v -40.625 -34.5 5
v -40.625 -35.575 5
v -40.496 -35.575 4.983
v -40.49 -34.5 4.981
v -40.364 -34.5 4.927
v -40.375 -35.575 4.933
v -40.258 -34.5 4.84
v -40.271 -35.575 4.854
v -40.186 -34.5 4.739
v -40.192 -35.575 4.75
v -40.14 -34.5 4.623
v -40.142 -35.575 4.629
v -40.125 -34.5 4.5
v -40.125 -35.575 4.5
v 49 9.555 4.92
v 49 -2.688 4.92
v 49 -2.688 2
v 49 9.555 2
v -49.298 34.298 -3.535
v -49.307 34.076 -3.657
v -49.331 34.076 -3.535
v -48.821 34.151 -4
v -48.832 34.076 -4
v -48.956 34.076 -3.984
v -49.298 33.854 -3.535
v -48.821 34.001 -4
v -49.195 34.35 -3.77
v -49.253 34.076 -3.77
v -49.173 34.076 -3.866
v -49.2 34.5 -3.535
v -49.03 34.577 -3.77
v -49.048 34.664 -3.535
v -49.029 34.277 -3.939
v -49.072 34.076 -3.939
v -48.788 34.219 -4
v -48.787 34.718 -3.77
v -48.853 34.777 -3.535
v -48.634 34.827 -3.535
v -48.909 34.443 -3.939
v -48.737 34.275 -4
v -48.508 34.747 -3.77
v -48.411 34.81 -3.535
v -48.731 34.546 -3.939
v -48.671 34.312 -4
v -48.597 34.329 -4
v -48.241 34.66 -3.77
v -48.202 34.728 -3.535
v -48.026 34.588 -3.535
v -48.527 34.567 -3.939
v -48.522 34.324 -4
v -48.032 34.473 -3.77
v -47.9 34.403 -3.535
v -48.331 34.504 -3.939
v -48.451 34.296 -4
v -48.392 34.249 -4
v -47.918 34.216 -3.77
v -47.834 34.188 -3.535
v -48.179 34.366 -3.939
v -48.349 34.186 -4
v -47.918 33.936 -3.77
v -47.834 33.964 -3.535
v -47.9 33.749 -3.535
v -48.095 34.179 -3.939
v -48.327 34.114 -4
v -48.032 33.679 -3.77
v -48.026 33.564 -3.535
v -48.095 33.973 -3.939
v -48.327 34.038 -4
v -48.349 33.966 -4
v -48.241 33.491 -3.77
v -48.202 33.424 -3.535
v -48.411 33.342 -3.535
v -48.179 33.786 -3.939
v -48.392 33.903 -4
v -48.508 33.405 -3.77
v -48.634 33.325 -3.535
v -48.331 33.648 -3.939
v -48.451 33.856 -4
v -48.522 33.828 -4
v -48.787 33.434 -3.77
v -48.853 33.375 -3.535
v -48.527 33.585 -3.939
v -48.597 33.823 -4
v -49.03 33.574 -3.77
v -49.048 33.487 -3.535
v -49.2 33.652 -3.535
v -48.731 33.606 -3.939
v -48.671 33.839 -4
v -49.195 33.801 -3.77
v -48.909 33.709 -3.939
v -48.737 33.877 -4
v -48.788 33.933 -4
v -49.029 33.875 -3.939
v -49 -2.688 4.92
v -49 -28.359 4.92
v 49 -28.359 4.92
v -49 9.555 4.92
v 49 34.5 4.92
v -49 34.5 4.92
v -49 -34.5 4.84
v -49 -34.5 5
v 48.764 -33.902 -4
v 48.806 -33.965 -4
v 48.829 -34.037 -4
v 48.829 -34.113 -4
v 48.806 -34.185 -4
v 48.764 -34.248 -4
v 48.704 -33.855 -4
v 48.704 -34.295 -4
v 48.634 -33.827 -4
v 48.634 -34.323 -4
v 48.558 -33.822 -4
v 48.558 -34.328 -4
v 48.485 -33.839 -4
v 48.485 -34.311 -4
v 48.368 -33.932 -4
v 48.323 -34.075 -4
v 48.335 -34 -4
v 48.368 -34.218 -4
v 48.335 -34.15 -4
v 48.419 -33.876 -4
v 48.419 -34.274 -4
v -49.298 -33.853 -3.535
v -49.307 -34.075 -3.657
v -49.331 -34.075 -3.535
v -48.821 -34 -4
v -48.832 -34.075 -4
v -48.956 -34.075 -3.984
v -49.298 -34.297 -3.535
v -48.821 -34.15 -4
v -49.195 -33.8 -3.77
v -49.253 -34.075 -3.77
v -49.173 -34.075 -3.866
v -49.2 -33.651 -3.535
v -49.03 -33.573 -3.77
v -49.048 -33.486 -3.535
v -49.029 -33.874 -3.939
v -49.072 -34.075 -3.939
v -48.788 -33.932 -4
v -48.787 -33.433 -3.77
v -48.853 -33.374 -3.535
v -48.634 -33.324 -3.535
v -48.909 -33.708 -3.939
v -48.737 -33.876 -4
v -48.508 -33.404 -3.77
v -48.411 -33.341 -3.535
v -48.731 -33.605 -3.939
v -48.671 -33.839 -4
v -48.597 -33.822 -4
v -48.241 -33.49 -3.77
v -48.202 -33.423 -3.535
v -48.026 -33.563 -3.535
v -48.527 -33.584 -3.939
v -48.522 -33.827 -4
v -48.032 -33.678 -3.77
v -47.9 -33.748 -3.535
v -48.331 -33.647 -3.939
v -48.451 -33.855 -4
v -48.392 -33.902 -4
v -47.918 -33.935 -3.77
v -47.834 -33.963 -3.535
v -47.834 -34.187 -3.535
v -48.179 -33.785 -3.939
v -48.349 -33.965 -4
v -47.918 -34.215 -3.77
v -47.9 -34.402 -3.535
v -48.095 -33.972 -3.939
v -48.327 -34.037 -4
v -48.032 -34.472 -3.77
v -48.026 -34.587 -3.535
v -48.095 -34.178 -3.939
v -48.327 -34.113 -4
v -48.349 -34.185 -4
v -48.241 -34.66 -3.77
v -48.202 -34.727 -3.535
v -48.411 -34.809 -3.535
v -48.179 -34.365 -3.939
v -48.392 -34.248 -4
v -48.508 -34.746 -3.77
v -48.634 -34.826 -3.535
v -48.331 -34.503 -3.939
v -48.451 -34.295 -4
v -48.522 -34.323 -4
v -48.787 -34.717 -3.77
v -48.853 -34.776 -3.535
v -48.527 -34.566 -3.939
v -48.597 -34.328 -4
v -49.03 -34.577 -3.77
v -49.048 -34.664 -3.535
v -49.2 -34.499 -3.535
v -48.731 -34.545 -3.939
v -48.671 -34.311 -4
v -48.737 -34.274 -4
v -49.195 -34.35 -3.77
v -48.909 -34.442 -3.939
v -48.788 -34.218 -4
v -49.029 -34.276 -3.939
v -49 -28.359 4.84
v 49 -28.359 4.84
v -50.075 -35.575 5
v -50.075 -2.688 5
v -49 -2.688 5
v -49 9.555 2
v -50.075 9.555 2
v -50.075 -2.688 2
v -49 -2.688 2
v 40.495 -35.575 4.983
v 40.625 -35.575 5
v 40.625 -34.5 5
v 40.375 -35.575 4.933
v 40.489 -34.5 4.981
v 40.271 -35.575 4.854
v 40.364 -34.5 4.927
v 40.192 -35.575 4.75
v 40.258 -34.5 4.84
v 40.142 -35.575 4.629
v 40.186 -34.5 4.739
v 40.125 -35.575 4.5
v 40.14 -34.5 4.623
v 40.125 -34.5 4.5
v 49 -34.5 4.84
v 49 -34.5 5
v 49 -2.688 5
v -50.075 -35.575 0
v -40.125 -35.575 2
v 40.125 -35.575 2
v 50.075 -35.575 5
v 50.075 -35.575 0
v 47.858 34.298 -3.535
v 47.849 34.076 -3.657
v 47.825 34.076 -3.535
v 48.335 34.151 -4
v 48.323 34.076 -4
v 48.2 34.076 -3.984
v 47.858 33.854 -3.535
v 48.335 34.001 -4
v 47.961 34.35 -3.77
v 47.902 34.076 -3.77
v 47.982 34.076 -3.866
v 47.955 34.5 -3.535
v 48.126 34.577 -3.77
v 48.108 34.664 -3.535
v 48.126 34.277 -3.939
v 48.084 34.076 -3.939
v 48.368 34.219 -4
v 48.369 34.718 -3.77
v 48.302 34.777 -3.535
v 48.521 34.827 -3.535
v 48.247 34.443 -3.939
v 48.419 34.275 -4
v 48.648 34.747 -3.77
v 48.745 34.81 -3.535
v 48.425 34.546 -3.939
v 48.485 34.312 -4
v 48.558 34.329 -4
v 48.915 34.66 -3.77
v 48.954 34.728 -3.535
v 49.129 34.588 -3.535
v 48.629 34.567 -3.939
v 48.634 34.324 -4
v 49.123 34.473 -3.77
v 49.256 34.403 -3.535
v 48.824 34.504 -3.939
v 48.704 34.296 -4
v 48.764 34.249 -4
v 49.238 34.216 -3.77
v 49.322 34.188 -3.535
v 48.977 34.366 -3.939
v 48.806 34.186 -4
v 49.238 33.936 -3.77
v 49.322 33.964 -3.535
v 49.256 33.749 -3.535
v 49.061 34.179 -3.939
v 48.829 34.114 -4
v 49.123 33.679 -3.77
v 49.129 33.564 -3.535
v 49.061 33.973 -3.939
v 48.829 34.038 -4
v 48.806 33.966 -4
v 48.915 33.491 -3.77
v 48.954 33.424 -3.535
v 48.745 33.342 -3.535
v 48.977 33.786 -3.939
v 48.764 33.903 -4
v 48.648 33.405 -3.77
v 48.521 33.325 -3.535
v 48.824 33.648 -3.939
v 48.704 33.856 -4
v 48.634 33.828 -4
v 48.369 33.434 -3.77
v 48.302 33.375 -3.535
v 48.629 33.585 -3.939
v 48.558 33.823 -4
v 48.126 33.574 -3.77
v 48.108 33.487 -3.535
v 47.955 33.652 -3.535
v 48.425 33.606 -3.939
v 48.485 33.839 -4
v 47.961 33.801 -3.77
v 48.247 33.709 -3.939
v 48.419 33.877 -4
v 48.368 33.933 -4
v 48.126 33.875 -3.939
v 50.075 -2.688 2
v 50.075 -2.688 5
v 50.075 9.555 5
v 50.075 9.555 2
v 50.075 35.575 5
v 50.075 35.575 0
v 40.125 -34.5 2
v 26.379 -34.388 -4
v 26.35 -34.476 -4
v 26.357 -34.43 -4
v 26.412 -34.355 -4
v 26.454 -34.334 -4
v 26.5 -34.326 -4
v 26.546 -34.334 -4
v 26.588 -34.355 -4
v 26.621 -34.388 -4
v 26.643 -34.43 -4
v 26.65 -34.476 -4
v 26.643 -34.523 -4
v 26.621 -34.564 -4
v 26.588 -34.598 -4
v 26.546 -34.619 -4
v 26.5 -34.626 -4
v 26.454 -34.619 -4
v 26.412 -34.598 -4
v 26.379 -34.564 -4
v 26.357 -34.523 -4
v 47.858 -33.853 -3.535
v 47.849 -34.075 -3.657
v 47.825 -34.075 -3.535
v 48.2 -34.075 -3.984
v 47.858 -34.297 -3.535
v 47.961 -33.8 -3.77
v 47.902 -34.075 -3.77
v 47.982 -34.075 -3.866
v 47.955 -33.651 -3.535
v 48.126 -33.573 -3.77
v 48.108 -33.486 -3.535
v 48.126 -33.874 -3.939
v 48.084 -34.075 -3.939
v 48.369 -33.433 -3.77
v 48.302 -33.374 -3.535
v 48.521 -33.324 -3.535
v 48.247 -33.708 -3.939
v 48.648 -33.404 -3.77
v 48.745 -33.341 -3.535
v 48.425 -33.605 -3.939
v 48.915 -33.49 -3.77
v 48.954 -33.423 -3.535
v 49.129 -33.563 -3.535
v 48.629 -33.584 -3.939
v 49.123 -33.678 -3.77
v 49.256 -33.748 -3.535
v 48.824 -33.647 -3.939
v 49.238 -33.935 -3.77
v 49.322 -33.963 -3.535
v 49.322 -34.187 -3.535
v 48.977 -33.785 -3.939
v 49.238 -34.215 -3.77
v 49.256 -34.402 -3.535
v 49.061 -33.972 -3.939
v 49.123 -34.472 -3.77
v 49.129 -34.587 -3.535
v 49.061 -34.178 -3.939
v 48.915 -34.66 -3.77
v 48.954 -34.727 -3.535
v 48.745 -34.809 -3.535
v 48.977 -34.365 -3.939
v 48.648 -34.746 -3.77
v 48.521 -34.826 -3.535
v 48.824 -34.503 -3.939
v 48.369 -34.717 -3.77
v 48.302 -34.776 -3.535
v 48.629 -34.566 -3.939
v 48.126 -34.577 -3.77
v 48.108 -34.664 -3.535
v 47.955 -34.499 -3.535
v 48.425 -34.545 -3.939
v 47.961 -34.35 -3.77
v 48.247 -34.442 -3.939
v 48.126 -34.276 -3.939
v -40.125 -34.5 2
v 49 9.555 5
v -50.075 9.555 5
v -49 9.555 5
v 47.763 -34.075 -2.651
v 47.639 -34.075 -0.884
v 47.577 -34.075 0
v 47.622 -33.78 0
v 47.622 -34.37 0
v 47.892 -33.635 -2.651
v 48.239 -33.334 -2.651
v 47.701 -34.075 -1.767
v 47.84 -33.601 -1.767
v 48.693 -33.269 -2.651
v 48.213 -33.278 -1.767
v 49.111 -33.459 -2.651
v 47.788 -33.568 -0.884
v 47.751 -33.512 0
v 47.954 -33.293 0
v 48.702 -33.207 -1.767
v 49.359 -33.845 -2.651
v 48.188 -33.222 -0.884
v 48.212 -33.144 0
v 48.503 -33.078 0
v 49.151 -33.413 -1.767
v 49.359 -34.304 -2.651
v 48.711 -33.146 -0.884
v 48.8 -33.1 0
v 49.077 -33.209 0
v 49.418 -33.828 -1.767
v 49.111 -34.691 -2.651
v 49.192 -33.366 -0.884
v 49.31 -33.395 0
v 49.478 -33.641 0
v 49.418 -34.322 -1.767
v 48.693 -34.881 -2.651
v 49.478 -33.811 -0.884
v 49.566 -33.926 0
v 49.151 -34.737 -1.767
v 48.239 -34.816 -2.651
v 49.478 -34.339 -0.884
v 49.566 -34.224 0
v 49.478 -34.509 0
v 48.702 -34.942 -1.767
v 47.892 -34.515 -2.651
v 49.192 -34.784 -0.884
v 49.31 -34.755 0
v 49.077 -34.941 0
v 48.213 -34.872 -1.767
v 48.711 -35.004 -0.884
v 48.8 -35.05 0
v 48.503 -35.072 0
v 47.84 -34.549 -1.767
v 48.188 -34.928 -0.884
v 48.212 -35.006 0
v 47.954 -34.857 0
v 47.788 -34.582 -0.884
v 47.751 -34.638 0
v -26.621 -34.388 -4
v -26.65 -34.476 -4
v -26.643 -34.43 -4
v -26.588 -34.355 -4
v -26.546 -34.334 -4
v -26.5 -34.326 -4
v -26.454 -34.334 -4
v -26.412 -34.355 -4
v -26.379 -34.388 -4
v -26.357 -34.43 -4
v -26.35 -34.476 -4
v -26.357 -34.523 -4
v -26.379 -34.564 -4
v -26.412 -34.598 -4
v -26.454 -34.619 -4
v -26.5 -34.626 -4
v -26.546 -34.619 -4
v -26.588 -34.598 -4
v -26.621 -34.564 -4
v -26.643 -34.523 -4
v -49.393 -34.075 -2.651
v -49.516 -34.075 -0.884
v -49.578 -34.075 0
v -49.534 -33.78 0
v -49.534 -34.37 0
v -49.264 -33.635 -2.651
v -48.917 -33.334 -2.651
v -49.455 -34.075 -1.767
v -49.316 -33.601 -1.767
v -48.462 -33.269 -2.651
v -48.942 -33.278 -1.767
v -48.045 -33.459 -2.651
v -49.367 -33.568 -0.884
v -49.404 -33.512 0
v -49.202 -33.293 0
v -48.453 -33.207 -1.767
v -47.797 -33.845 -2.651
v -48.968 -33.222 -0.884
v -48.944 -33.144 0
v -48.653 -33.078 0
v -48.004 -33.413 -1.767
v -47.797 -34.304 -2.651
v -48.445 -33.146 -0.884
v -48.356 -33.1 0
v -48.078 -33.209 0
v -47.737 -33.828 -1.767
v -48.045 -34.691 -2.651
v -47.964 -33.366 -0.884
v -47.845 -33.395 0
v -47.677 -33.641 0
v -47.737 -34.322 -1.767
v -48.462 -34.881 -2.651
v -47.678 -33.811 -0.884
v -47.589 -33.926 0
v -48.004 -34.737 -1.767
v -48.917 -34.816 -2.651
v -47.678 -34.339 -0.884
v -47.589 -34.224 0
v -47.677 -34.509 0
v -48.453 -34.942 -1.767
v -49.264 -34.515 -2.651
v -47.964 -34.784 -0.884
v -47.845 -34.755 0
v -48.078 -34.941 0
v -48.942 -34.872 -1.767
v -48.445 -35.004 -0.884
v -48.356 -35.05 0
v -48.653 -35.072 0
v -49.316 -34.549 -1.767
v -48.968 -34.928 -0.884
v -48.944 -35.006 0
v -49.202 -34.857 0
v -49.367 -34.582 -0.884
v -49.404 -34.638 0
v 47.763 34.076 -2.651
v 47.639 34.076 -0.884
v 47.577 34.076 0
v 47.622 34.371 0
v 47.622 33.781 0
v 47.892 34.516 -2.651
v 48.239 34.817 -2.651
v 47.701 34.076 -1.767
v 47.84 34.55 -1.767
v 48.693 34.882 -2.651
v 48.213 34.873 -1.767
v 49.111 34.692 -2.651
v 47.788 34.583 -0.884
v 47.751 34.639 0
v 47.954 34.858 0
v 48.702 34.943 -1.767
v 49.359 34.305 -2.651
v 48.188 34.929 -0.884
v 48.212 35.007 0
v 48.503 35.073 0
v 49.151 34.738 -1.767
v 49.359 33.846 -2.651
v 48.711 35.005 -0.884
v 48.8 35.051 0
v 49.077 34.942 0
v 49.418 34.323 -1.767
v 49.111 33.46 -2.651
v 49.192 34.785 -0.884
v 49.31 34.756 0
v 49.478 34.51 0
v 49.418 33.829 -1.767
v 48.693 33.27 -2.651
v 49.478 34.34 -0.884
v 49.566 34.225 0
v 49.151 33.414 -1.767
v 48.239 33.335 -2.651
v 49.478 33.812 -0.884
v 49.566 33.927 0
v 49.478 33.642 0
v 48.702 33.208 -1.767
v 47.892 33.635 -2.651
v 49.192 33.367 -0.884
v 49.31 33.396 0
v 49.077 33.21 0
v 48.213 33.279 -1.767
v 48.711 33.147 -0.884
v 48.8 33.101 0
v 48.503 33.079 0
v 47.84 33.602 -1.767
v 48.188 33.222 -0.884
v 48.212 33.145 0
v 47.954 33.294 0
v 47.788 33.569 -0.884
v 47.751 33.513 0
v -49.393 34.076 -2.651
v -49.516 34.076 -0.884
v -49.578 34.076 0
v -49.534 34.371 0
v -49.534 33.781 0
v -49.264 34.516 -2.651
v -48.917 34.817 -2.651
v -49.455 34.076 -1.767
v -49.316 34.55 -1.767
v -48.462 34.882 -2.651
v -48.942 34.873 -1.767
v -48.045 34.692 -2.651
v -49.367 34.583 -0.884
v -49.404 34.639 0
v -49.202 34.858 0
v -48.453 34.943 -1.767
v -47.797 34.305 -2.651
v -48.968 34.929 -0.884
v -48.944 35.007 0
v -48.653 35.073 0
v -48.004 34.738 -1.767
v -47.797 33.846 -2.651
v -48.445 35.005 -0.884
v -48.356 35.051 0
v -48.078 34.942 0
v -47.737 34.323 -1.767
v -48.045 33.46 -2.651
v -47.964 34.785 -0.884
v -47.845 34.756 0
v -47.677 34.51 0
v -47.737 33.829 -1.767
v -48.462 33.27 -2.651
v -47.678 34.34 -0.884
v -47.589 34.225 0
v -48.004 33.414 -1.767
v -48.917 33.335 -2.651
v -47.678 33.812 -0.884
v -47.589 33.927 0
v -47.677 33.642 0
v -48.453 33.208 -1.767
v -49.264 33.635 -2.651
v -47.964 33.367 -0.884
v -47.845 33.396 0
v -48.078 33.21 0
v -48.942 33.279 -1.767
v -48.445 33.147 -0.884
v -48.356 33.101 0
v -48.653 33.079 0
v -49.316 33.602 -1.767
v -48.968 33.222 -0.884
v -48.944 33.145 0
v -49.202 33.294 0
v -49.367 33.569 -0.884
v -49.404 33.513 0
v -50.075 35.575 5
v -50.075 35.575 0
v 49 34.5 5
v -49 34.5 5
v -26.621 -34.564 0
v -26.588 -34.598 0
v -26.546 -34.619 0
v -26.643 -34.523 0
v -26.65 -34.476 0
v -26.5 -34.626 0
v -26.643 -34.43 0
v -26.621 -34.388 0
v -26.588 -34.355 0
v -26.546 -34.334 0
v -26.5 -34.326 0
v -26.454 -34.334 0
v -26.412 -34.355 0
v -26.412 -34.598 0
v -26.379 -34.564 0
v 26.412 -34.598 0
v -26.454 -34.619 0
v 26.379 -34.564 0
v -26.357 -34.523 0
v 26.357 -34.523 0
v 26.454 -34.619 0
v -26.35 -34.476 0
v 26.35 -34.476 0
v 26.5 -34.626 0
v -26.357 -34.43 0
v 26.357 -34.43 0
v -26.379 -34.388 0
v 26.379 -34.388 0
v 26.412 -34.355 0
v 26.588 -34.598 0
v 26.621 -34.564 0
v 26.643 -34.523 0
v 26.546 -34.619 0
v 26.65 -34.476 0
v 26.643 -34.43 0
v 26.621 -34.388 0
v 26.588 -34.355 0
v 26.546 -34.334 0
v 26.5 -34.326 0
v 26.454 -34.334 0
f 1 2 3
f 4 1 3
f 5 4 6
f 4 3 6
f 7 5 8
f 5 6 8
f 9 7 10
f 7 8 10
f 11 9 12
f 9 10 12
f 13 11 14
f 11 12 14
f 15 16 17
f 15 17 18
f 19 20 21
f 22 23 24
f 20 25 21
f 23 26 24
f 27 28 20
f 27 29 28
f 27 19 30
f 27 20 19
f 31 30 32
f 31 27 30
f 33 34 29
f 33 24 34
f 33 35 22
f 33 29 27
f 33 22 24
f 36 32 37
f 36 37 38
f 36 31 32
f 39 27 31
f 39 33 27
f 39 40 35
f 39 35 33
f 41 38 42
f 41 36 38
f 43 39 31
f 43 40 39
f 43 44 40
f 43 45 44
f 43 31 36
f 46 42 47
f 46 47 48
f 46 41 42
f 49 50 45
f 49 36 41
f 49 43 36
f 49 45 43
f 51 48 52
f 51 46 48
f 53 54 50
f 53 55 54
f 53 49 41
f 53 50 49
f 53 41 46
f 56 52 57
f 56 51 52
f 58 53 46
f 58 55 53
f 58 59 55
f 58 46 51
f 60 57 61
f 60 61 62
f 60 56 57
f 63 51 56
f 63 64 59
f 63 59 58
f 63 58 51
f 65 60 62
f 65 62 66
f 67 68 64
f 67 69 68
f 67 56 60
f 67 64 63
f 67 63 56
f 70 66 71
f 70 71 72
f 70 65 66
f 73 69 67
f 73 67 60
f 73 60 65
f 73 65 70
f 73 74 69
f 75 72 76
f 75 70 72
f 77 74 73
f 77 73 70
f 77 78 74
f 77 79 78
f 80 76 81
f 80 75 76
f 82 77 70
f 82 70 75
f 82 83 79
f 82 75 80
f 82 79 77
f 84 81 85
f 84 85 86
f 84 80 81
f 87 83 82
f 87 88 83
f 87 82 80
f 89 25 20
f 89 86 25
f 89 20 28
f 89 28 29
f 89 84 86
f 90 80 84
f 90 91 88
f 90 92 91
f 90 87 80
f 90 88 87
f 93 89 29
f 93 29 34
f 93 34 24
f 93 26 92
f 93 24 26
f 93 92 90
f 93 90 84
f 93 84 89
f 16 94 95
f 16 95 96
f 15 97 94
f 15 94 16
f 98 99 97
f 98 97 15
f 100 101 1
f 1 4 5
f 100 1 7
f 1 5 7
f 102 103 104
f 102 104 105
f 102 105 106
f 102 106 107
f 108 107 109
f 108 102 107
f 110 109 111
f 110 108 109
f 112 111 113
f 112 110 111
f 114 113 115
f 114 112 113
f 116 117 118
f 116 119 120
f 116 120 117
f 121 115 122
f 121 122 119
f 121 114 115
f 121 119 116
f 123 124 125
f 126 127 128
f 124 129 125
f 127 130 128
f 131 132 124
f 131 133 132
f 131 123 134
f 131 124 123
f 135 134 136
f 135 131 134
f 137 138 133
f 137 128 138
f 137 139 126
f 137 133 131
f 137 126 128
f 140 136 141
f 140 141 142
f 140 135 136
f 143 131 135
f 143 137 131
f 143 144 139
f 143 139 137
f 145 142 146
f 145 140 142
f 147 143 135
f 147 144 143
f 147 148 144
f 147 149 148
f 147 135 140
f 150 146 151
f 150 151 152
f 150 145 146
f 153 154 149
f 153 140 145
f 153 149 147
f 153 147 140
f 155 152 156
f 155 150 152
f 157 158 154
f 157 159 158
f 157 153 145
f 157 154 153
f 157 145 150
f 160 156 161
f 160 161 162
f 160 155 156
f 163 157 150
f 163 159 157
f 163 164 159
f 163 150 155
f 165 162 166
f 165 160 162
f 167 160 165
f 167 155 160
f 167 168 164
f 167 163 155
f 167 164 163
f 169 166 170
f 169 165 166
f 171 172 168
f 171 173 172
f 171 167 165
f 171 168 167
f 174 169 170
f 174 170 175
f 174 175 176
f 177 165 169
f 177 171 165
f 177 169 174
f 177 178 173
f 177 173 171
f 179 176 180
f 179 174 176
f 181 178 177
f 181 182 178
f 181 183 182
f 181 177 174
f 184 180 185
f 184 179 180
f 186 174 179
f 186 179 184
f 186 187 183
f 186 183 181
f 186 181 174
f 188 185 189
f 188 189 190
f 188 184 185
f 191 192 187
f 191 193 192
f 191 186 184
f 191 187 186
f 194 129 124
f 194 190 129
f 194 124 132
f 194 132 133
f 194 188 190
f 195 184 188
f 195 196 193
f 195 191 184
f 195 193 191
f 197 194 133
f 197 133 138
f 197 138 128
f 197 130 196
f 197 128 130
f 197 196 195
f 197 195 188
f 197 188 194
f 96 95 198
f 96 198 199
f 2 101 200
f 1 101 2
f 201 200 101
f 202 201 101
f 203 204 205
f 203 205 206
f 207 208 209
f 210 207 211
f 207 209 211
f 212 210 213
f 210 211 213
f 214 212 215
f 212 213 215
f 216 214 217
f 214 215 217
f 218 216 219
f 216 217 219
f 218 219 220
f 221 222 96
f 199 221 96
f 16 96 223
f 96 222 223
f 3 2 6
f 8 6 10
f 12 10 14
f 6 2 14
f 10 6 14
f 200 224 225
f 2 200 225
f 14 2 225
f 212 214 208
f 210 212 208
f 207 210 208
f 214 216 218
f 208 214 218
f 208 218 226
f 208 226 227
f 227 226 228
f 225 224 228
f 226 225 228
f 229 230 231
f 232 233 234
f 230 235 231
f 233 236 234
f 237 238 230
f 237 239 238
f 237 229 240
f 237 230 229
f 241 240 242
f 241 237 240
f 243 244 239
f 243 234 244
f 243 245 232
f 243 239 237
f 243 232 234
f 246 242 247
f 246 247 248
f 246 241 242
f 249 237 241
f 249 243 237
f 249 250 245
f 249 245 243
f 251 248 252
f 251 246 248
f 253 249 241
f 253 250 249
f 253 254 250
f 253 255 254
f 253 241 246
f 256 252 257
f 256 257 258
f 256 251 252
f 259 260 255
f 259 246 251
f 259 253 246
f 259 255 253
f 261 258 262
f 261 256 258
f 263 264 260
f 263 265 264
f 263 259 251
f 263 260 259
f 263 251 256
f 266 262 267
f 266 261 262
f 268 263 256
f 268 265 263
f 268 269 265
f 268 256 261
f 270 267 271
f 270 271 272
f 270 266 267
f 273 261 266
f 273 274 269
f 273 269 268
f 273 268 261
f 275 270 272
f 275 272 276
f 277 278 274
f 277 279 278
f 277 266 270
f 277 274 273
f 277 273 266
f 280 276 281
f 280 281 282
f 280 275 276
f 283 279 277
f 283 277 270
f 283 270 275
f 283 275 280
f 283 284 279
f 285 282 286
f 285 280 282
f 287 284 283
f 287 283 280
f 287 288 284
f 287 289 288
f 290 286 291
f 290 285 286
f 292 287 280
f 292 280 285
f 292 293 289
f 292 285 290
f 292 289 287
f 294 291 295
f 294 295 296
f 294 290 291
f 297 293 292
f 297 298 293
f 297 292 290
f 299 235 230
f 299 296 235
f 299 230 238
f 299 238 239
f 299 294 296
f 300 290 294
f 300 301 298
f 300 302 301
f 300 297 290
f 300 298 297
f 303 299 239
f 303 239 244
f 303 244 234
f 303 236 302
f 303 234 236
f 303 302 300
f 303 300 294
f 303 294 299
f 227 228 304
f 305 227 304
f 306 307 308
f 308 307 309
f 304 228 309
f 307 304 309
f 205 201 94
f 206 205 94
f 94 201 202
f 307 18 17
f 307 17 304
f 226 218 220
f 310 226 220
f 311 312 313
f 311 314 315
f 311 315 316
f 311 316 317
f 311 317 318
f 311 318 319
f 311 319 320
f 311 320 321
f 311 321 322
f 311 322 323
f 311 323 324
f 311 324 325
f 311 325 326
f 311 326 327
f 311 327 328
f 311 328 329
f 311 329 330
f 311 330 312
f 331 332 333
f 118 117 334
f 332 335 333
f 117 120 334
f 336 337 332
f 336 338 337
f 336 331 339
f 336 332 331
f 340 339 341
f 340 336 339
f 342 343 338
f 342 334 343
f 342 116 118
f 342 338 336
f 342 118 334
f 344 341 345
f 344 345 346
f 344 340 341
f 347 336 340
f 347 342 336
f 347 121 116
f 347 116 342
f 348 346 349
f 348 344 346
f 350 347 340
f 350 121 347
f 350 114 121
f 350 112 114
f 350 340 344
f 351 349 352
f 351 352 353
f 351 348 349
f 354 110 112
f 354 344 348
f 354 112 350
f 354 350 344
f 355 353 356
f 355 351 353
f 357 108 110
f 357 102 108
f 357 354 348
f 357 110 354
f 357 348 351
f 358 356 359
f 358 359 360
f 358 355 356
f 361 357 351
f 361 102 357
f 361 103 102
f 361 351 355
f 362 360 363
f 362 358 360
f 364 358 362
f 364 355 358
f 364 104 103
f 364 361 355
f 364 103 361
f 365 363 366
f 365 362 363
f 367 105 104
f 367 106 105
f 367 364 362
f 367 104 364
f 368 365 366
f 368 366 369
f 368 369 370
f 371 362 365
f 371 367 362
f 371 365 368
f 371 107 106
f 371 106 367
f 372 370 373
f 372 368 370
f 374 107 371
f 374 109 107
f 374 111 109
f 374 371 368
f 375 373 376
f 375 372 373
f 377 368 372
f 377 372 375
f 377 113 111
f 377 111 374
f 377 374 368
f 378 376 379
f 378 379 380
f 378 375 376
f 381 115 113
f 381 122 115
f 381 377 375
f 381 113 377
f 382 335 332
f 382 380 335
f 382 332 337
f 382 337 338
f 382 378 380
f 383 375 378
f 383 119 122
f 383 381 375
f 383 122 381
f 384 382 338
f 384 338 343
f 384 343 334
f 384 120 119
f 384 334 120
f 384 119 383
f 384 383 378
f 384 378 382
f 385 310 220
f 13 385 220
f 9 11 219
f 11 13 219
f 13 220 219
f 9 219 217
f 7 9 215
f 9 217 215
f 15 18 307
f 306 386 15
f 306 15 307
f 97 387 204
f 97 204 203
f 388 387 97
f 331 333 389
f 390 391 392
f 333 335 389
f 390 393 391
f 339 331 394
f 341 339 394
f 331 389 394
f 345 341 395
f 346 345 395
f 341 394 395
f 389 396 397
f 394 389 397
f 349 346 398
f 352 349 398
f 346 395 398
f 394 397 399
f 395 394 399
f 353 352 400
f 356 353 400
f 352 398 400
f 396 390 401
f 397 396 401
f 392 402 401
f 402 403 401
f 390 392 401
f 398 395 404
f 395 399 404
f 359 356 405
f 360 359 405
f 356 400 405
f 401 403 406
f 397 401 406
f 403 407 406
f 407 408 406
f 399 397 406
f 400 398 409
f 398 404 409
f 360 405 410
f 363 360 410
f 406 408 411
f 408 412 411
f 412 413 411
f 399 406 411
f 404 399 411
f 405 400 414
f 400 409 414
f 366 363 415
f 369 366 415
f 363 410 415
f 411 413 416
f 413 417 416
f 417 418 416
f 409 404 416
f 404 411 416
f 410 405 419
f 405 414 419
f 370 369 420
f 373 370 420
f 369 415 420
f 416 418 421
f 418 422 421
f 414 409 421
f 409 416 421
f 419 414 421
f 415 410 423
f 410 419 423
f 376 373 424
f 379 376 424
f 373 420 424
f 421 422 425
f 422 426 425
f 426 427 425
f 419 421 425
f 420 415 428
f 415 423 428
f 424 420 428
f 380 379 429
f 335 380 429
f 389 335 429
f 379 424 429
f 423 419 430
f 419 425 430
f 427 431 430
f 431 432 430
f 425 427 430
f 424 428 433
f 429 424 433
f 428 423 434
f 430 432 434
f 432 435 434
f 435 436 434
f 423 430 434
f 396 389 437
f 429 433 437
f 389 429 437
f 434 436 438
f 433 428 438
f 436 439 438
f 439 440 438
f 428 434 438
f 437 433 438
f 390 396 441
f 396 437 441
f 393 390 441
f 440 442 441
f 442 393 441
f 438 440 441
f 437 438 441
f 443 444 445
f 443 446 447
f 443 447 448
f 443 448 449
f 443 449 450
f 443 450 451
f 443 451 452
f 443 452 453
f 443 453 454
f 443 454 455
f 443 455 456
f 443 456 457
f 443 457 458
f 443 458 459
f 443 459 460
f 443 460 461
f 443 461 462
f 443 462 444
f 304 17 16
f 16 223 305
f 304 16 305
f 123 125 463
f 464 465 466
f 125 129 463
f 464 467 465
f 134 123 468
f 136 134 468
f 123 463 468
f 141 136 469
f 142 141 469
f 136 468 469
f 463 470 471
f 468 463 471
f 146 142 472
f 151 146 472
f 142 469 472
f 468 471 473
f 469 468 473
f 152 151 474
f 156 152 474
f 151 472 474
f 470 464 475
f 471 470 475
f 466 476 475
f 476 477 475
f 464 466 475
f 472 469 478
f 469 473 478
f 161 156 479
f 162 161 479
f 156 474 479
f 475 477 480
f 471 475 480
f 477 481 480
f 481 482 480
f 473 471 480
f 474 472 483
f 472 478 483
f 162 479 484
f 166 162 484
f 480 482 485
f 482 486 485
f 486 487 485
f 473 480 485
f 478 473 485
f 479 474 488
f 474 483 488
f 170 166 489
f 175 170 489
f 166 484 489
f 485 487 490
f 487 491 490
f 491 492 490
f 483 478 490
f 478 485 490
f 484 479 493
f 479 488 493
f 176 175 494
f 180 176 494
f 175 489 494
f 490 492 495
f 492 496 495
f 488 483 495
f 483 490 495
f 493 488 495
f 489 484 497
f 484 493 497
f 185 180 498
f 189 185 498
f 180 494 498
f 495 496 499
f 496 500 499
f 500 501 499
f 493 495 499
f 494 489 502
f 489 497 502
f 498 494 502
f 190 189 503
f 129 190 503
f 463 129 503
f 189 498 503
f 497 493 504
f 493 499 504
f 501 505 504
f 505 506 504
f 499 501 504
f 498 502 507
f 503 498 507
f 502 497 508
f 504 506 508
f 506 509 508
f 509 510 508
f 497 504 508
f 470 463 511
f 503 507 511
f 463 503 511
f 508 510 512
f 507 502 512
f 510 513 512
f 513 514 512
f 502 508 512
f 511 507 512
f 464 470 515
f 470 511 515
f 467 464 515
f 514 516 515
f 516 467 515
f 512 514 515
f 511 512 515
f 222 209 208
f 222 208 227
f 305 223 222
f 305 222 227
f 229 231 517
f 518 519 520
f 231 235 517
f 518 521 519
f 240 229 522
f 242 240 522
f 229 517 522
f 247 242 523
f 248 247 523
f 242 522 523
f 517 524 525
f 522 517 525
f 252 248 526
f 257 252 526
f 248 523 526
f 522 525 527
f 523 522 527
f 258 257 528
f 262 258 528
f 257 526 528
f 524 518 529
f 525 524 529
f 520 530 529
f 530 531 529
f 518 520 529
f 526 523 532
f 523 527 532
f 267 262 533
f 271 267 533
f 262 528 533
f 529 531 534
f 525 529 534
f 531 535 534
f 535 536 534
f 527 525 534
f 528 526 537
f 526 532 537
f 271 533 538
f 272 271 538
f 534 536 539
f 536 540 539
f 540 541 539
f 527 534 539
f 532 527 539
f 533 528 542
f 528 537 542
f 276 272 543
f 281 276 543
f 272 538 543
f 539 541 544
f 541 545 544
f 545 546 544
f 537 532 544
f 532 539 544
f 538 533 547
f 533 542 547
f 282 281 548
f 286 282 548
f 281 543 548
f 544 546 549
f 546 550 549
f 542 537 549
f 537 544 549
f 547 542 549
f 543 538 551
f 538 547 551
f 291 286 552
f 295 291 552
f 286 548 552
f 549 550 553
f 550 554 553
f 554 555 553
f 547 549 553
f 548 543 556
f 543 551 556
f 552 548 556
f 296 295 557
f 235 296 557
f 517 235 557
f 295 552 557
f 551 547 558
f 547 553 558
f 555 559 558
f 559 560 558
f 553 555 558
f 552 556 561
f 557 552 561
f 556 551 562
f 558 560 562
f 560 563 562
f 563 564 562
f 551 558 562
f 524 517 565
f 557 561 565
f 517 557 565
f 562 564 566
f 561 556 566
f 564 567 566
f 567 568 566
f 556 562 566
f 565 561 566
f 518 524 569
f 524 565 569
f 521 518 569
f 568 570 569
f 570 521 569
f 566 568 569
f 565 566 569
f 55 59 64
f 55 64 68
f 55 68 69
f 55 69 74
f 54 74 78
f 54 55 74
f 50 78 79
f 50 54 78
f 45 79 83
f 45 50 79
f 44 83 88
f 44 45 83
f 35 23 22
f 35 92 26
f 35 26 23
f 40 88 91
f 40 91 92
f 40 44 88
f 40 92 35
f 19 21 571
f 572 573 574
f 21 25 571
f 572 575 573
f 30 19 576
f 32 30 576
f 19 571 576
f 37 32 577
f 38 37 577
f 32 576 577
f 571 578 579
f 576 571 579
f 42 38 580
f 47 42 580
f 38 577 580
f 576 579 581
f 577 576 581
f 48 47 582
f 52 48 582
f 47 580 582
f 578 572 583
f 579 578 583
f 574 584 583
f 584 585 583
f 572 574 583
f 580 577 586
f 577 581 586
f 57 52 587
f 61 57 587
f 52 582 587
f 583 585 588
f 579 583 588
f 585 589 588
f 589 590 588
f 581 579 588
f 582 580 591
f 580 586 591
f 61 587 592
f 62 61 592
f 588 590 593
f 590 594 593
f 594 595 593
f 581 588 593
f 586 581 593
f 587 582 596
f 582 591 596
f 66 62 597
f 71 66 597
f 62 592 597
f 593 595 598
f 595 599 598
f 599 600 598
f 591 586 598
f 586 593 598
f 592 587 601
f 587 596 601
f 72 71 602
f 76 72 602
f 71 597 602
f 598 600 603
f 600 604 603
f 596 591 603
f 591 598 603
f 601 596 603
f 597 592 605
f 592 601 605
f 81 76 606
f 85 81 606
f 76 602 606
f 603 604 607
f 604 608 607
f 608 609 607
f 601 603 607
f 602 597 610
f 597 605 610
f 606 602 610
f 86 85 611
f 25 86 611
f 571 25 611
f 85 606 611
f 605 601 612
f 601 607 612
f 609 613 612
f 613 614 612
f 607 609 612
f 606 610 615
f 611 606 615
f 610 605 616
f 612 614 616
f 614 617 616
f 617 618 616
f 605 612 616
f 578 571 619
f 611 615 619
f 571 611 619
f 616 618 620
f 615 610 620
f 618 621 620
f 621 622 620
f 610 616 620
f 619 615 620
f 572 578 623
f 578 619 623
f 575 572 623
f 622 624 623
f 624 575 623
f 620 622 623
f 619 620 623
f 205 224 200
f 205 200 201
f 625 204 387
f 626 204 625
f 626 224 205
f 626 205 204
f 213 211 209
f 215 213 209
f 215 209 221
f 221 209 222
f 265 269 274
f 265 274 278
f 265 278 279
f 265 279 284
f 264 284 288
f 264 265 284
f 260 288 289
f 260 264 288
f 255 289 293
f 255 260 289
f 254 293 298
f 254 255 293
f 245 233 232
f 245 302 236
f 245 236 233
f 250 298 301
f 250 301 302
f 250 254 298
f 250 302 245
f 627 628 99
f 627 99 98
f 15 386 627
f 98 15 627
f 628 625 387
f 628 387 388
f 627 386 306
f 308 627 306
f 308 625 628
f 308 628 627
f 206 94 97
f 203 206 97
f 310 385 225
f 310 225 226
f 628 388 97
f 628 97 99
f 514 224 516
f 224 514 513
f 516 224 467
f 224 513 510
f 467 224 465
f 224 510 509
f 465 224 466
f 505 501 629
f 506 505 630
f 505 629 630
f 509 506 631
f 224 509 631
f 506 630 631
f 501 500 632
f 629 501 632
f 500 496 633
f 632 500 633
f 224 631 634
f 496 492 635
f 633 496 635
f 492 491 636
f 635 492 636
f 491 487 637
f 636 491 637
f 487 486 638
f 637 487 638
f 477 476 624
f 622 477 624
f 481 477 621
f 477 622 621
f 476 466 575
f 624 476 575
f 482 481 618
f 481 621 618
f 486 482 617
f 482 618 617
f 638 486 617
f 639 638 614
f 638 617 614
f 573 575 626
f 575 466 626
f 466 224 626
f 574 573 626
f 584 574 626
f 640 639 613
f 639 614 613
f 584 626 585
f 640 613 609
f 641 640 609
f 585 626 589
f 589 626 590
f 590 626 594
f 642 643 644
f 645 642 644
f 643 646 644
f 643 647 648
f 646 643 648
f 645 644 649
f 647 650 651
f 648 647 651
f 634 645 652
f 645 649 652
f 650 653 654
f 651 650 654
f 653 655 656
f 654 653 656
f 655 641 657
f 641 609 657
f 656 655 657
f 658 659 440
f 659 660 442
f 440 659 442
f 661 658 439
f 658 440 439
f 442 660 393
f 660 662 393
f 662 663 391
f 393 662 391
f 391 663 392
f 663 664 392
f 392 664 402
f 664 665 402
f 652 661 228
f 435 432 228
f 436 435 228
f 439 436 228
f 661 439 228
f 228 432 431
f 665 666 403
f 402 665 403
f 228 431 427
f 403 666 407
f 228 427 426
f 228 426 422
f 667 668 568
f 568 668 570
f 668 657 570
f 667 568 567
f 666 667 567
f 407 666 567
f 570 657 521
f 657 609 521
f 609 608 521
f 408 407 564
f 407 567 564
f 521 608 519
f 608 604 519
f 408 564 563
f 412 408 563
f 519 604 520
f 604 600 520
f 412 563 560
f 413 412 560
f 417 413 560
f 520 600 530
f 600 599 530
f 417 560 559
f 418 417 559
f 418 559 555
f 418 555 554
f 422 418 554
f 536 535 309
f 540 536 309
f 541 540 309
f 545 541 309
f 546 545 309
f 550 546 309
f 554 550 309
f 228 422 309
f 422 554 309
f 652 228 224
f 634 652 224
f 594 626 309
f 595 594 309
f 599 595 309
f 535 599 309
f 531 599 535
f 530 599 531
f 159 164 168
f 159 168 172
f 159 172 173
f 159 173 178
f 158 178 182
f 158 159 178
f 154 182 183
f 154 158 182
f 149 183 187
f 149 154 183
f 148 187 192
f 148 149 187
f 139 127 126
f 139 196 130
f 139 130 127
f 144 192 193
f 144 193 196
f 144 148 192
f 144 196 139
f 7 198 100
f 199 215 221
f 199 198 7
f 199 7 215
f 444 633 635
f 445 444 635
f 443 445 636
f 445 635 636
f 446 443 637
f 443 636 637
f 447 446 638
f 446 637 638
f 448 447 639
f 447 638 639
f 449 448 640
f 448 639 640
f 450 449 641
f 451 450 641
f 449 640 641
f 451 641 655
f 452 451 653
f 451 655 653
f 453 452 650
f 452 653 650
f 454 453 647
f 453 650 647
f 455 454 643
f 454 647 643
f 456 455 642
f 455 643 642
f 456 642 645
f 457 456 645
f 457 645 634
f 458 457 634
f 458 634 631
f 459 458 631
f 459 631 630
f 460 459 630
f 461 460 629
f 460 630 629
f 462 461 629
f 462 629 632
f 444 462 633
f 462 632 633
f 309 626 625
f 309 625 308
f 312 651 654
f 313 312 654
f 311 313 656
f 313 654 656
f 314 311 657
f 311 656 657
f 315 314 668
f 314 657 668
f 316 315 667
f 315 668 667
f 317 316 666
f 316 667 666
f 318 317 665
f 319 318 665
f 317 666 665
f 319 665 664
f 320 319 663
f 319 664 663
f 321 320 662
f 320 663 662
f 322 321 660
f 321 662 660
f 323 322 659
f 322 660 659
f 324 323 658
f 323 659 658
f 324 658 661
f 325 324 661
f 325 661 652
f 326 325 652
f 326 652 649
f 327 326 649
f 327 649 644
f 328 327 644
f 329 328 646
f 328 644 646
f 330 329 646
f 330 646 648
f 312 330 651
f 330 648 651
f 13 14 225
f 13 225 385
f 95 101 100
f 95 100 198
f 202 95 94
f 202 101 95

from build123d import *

# Parameters (mm, degrees)
ESQUISSE2_W                  = 100.15
ESQUISSE2_H                  = 71.15
BOSS_EXTRU_1_DEPTH           = 5
ESQUISSE3_W                  = 98
ESQUISSE3_H                  = 69
ENL_V_MAT_EXTRU_1_DEPTH      = 0.08
ESQUISSE4_W                  = 98
ESQUISSE4_H                  = 6.140882506
ENL_V_MAT_EXTRU_2_DEPTH      = 0.08
ESQUISSE5_W                  = 80.249689796
ESQUISSE5_H                  = 1.075
ENL_V_MAT_EXTRU_3_DEPTH      = 3
CONG_1_R                     = 0.5
CONG_2_R                     = 0.5
ESQUISSE7_W                  = 1.075
ESQUISSE7_H                  = 12.243191877
ENL_V_MAT_EXTRU_4_DEPTH      = 3
ESQUISSE8_R                  = 1
BOSS_EXTRU_3_DEPTH           = 4
BOSS_EXTRU_3_DRAFT           = 4
BOSS_EXTRU_3_PROFILE_2_DEPTH = 4
BOSS_EXTRU_3_PROFILE_2_DRAFT = 4
BOSS_EXTRU_3_PROFILE_3_DEPTH = 4
BOSS_EXTRU_3_PROFILE_3_DRAFT = 4
BOSS_EXTRU_3_PROFILE_4_DEPTH = 4
BOSS_EXTRU_3_PROFILE_4_DRAFT = 4
CONG_3_R                     = 0.5
CONG_4_R                     = 0.5
CONG_5_R                     = 0.5
CONG_6_R                     = 0.5
ESQUISSE9_R                  = 0.15
BOSS_EXTRU_5_DEPTH           = 4


with BuildPart() as part:
    # Esquisse2 → Boss.-Extru.1 (new body)
    with BuildSketch(Plane.XY):
        Rectangle(ESQUISSE2_W, ESQUISSE2_H)
    extrude(amount=BOSS_EXTRU_1_DEPTH)

    # Esquisse3 → Enlèv. mat.-Extru.1 (cut)
    with BuildSketch(Plane.XY.offset(5)):
        Rectangle(ESQUISSE3_W, ESQUISSE3_H)
    extrude(amount=-ENL_V_MAT_EXTRU_1_DEPTH, mode=Mode.SUBTRACT)

    # Esquisse4 → Enlèv. mat.-Extru.2 (cut)
    with BuildSketch(Plane.XY.offset(4.92)):
        with Locations((0, -31.429558747)):
            Rectangle(ESQUISSE4_W, ESQUISSE4_H)
    extrude(amount=-ENL_V_MAT_EXTRU_2_DEPTH, mode=Mode.SUBTRACT)

    # Esquisse5 → Enlèv. mat.-Extru.3 (cut)
    with BuildSketch(Plane.XY.offset(5)):
        with Locations((-0.000155102, -35.0375)):
            Rectangle(ESQUISSE5_W, ESQUISSE5_H)
    extrude(amount=-ENL_V_MAT_EXTRU_3_DEPTH, mode=Mode.SUBTRACT)

    # Congé1
    # the kernel refuses this fillet: 0.5 mm, written as the material it takes off along each edge
    with BuildSketch(Plane(origin=(-40.125, -36.825, 5), x_dir=(-1, 0, 0), z_dir=(0, 1, 0))) as cong_1_piece_1:
        with BuildLine():
            CenterArc((CONG_1_R, -CONG_1_R), CONG_1_R, 90, 90)
            Line((0, -CONG_1_R), (0, 0))
            Line((0, 0), (CONG_1_R, 0))
        make_face()
    extrude(amount=2.325, mode=Mode.SUBTRACT)

    # Congé2
    # the kernel refuses this fillet: 0.5 mm, written as the material it takes off along each edge
    with BuildSketch(Plane(origin=(40.124689796, -34.5, 5), x_dir=(0, 0, -1), z_dir=(0, -1, 0))) as cong_2_piece_1:
        with BuildLine():
            CenterArc((CONG_2_R, CONG_2_R), CONG_2_R, 180, 90)
            Line((0, CONG_2_R), (0, 0))
            Line((0, 0), (CONG_2_R, 0))
        make_face()
    extrude(amount=2.325, mode=Mode.SUBTRACT)

    # Esquisse7 → Enlèv. mat.-Extru.4 (cut)
    with BuildSketch(Plane.XY.offset(5)):
        with Locations((-49.5375, 3.433132672)):
            Rectangle(ESQUISSE7_W, ESQUISSE7_H)
        with Locations((49.5375, 3.433132672)):
            Rectangle(ESQUISSE7_W, ESQUISSE7_H)
    extrude(amount=-ENL_V_MAT_EXTRU_4_DEPTH, mode=Mode.SUBTRACT)


with BuildPart() as boss_extru_3_tool:
    # Esquisse8 → Boss.-Extru.3 (with draft: the straight prism first)
    with BuildSketch(Plane(origin=(0, 0, 0), x_dir=(-1, 0, 0), z_dir=(0, 0, -1))):
        with Locations((-48.577420287, -34.074984175)):
            Circle(ESQUISSE8_R)
    extrude(amount=BOSS_EXTRU_3_DEPTH)
    # Boss.-Extru.3: the draft: its side faces are tilted about the plane it starts from
    boss_extru_3_sides = [boss_extru_3_tool.faces().sort_by_distance(p)[0] for p in [
        (49.577420287, -34.074984175, -2),
    ]]
    draft(boss_extru_3_sides, Plane(origin=(0, 0, 0), x_dir=(-1, 0, 0), z_dir=(0, 0, -1)), BOSS_EXTRU_3_DRAFT)


with BuildPart() as part_1:
    add(part.part)

    # Boss.-Extru.3: add boss_extru_3_tool
    add(boss_extru_3_tool.part)


with BuildPart() as boss_extru_3_profile_2_tool:
    # Esquisse8 → Boss.-Extru.3 profile 2 (with draft: the straight prism first)
    with BuildSketch(Plane(origin=(0, 0, 0), x_dir=(-1, 0, 0), z_dir=(0, 0, -1))):
        with Locations((-48.577420287, 34.07588992)):
            Circle(ESQUISSE8_R)
    extrude(amount=BOSS_EXTRU_3_PROFILE_2_DEPTH)
    # Boss.-Extru.3 profile 2: the draft: its side faces are tilted about the plane it starts from
    boss_extru_3_profile_2_sides = [boss_extru_3_profile_2_tool.faces().sort_by_distance(p)[0] for p in [
        (49.577420287, 34.07588992, -2),
    ]]
    draft(boss_extru_3_profile_2_sides, Plane(origin=(0, 0, 0), x_dir=(-1, 0, 0), z_dir=(0, 0, -1)), BOSS_EXTRU_3_PROFILE_2_DRAFT)


with BuildPart() as part_2:
    add(part_1.part)

    # Boss.-Extru.3 profile 2: add boss_extru_3_profile_2_tool
    add(boss_extru_3_profile_2_tool.part)


with BuildPart() as boss_extru_3_profile_3_tool:
    # Esquisse8 → Boss.-Extru.3 profile 3 (with draft: the straight prism first)
    with BuildSketch(Plane(origin=(0, 0, 0), x_dir=(-1, 0, 0), z_dir=(0, 0, -1))):
        with Locations((48.578218454, 34.07588992)):
            Circle(ESQUISSE8_R)
    extrude(amount=BOSS_EXTRU_3_PROFILE_3_DEPTH)
    # Boss.-Extru.3 profile 3: the draft: its side faces are tilted about the plane it starts from
    boss_extru_3_profile_3_sides = [boss_extru_3_profile_3_tool.faces().sort_by_distance(p)[0] for p in [
        (-47.578218454, 34.07588992, -2),
    ]]
    draft(boss_extru_3_profile_3_sides, Plane(origin=(0, 0, 0), x_dir=(-1, 0, 0), z_dir=(0, 0, -1)), BOSS_EXTRU_3_PROFILE_3_DRAFT)


with BuildPart() as part_3:
    add(part_2.part)

    # Boss.-Extru.3 profile 3: add boss_extru_3_profile_3_tool
    add(boss_extru_3_profile_3_tool.part)


with BuildPart() as boss_extru_3_profile_4_tool:
    # Esquisse8 → Boss.-Extru.3 profile 4 (with draft: the straight prism first)
    with BuildSketch(Plane(origin=(0, 0, 0), x_dir=(-1, 0, 0), z_dir=(0, 0, -1))):
        with Locations((48.578218454, -34.074984175)):
            Circle(ESQUISSE8_R)
    extrude(amount=BOSS_EXTRU_3_PROFILE_4_DEPTH)
    # Boss.-Extru.3 profile 4: the draft: its side faces are tilted about the plane it starts from
    boss_extru_3_profile_4_sides = [boss_extru_3_profile_4_tool.faces().sort_by_distance(p)[0] for p in [
        (-47.578218454, -34.074984175, -2),
    ]]
    draft(boss_extru_3_profile_4_sides, Plane(origin=(0, 0, 0), x_dir=(-1, 0, 0), z_dir=(0, 0, -1)), BOSS_EXTRU_3_PROFILE_4_DRAFT)


with BuildPart() as part_4:
    add(part_3.part)

    # Boss.-Extru.3 profile 4: add boss_extru_3_profile_4_tool
    add(boss_extru_3_profile_4_tool.part)

    # Congé3
    cong_3_edges = [part_4.edges().sort_by_distance(p)[0] for p in [
        (49.297713039, 34.07588992, -4),
    ]]
    fillet(cong_3_edges, radius=CONG_3_R)

    # Congé4
    cong_4_edges = [part_4.edges().sort_by_distance(p)[0] for p in [
        (-47.857925701, 34.07588992, -4),
    ]]
    fillet(cong_4_edges, radius=CONG_4_R)

    # Congé5
    cong_5_edges = [part_4.edges().sort_by_distance(p)[0] for p in [
        (-47.857925701, -34.074984175, -4),
    ]]
    fillet(cong_5_edges, radius=CONG_5_R)

    # Congé6
    cong_6_edges = [part_4.edges().sort_by_distance(p)[0] for p in [
        (49.297713039, -34.074984175, -4),
    ]]
    fillet(cong_6_edges, radius=CONG_6_R)

    # Esquisse9 → Boss.-Extru.5 (add)
    with BuildSketch(Plane(origin=(0, 0, 0), x_dir=(-1, 0, 0), z_dir=(0, 0, -1))):
        with Locations((26.5, -34.476200763)):
            Circle(ESQUISSE9_R)
        with Locations((-26.5, -34.476200763)):
            Circle(ESQUISSE9_R)
    extrude(amount=BOSS_EXTRU_5_DEPTH)


solid = part_4.part
